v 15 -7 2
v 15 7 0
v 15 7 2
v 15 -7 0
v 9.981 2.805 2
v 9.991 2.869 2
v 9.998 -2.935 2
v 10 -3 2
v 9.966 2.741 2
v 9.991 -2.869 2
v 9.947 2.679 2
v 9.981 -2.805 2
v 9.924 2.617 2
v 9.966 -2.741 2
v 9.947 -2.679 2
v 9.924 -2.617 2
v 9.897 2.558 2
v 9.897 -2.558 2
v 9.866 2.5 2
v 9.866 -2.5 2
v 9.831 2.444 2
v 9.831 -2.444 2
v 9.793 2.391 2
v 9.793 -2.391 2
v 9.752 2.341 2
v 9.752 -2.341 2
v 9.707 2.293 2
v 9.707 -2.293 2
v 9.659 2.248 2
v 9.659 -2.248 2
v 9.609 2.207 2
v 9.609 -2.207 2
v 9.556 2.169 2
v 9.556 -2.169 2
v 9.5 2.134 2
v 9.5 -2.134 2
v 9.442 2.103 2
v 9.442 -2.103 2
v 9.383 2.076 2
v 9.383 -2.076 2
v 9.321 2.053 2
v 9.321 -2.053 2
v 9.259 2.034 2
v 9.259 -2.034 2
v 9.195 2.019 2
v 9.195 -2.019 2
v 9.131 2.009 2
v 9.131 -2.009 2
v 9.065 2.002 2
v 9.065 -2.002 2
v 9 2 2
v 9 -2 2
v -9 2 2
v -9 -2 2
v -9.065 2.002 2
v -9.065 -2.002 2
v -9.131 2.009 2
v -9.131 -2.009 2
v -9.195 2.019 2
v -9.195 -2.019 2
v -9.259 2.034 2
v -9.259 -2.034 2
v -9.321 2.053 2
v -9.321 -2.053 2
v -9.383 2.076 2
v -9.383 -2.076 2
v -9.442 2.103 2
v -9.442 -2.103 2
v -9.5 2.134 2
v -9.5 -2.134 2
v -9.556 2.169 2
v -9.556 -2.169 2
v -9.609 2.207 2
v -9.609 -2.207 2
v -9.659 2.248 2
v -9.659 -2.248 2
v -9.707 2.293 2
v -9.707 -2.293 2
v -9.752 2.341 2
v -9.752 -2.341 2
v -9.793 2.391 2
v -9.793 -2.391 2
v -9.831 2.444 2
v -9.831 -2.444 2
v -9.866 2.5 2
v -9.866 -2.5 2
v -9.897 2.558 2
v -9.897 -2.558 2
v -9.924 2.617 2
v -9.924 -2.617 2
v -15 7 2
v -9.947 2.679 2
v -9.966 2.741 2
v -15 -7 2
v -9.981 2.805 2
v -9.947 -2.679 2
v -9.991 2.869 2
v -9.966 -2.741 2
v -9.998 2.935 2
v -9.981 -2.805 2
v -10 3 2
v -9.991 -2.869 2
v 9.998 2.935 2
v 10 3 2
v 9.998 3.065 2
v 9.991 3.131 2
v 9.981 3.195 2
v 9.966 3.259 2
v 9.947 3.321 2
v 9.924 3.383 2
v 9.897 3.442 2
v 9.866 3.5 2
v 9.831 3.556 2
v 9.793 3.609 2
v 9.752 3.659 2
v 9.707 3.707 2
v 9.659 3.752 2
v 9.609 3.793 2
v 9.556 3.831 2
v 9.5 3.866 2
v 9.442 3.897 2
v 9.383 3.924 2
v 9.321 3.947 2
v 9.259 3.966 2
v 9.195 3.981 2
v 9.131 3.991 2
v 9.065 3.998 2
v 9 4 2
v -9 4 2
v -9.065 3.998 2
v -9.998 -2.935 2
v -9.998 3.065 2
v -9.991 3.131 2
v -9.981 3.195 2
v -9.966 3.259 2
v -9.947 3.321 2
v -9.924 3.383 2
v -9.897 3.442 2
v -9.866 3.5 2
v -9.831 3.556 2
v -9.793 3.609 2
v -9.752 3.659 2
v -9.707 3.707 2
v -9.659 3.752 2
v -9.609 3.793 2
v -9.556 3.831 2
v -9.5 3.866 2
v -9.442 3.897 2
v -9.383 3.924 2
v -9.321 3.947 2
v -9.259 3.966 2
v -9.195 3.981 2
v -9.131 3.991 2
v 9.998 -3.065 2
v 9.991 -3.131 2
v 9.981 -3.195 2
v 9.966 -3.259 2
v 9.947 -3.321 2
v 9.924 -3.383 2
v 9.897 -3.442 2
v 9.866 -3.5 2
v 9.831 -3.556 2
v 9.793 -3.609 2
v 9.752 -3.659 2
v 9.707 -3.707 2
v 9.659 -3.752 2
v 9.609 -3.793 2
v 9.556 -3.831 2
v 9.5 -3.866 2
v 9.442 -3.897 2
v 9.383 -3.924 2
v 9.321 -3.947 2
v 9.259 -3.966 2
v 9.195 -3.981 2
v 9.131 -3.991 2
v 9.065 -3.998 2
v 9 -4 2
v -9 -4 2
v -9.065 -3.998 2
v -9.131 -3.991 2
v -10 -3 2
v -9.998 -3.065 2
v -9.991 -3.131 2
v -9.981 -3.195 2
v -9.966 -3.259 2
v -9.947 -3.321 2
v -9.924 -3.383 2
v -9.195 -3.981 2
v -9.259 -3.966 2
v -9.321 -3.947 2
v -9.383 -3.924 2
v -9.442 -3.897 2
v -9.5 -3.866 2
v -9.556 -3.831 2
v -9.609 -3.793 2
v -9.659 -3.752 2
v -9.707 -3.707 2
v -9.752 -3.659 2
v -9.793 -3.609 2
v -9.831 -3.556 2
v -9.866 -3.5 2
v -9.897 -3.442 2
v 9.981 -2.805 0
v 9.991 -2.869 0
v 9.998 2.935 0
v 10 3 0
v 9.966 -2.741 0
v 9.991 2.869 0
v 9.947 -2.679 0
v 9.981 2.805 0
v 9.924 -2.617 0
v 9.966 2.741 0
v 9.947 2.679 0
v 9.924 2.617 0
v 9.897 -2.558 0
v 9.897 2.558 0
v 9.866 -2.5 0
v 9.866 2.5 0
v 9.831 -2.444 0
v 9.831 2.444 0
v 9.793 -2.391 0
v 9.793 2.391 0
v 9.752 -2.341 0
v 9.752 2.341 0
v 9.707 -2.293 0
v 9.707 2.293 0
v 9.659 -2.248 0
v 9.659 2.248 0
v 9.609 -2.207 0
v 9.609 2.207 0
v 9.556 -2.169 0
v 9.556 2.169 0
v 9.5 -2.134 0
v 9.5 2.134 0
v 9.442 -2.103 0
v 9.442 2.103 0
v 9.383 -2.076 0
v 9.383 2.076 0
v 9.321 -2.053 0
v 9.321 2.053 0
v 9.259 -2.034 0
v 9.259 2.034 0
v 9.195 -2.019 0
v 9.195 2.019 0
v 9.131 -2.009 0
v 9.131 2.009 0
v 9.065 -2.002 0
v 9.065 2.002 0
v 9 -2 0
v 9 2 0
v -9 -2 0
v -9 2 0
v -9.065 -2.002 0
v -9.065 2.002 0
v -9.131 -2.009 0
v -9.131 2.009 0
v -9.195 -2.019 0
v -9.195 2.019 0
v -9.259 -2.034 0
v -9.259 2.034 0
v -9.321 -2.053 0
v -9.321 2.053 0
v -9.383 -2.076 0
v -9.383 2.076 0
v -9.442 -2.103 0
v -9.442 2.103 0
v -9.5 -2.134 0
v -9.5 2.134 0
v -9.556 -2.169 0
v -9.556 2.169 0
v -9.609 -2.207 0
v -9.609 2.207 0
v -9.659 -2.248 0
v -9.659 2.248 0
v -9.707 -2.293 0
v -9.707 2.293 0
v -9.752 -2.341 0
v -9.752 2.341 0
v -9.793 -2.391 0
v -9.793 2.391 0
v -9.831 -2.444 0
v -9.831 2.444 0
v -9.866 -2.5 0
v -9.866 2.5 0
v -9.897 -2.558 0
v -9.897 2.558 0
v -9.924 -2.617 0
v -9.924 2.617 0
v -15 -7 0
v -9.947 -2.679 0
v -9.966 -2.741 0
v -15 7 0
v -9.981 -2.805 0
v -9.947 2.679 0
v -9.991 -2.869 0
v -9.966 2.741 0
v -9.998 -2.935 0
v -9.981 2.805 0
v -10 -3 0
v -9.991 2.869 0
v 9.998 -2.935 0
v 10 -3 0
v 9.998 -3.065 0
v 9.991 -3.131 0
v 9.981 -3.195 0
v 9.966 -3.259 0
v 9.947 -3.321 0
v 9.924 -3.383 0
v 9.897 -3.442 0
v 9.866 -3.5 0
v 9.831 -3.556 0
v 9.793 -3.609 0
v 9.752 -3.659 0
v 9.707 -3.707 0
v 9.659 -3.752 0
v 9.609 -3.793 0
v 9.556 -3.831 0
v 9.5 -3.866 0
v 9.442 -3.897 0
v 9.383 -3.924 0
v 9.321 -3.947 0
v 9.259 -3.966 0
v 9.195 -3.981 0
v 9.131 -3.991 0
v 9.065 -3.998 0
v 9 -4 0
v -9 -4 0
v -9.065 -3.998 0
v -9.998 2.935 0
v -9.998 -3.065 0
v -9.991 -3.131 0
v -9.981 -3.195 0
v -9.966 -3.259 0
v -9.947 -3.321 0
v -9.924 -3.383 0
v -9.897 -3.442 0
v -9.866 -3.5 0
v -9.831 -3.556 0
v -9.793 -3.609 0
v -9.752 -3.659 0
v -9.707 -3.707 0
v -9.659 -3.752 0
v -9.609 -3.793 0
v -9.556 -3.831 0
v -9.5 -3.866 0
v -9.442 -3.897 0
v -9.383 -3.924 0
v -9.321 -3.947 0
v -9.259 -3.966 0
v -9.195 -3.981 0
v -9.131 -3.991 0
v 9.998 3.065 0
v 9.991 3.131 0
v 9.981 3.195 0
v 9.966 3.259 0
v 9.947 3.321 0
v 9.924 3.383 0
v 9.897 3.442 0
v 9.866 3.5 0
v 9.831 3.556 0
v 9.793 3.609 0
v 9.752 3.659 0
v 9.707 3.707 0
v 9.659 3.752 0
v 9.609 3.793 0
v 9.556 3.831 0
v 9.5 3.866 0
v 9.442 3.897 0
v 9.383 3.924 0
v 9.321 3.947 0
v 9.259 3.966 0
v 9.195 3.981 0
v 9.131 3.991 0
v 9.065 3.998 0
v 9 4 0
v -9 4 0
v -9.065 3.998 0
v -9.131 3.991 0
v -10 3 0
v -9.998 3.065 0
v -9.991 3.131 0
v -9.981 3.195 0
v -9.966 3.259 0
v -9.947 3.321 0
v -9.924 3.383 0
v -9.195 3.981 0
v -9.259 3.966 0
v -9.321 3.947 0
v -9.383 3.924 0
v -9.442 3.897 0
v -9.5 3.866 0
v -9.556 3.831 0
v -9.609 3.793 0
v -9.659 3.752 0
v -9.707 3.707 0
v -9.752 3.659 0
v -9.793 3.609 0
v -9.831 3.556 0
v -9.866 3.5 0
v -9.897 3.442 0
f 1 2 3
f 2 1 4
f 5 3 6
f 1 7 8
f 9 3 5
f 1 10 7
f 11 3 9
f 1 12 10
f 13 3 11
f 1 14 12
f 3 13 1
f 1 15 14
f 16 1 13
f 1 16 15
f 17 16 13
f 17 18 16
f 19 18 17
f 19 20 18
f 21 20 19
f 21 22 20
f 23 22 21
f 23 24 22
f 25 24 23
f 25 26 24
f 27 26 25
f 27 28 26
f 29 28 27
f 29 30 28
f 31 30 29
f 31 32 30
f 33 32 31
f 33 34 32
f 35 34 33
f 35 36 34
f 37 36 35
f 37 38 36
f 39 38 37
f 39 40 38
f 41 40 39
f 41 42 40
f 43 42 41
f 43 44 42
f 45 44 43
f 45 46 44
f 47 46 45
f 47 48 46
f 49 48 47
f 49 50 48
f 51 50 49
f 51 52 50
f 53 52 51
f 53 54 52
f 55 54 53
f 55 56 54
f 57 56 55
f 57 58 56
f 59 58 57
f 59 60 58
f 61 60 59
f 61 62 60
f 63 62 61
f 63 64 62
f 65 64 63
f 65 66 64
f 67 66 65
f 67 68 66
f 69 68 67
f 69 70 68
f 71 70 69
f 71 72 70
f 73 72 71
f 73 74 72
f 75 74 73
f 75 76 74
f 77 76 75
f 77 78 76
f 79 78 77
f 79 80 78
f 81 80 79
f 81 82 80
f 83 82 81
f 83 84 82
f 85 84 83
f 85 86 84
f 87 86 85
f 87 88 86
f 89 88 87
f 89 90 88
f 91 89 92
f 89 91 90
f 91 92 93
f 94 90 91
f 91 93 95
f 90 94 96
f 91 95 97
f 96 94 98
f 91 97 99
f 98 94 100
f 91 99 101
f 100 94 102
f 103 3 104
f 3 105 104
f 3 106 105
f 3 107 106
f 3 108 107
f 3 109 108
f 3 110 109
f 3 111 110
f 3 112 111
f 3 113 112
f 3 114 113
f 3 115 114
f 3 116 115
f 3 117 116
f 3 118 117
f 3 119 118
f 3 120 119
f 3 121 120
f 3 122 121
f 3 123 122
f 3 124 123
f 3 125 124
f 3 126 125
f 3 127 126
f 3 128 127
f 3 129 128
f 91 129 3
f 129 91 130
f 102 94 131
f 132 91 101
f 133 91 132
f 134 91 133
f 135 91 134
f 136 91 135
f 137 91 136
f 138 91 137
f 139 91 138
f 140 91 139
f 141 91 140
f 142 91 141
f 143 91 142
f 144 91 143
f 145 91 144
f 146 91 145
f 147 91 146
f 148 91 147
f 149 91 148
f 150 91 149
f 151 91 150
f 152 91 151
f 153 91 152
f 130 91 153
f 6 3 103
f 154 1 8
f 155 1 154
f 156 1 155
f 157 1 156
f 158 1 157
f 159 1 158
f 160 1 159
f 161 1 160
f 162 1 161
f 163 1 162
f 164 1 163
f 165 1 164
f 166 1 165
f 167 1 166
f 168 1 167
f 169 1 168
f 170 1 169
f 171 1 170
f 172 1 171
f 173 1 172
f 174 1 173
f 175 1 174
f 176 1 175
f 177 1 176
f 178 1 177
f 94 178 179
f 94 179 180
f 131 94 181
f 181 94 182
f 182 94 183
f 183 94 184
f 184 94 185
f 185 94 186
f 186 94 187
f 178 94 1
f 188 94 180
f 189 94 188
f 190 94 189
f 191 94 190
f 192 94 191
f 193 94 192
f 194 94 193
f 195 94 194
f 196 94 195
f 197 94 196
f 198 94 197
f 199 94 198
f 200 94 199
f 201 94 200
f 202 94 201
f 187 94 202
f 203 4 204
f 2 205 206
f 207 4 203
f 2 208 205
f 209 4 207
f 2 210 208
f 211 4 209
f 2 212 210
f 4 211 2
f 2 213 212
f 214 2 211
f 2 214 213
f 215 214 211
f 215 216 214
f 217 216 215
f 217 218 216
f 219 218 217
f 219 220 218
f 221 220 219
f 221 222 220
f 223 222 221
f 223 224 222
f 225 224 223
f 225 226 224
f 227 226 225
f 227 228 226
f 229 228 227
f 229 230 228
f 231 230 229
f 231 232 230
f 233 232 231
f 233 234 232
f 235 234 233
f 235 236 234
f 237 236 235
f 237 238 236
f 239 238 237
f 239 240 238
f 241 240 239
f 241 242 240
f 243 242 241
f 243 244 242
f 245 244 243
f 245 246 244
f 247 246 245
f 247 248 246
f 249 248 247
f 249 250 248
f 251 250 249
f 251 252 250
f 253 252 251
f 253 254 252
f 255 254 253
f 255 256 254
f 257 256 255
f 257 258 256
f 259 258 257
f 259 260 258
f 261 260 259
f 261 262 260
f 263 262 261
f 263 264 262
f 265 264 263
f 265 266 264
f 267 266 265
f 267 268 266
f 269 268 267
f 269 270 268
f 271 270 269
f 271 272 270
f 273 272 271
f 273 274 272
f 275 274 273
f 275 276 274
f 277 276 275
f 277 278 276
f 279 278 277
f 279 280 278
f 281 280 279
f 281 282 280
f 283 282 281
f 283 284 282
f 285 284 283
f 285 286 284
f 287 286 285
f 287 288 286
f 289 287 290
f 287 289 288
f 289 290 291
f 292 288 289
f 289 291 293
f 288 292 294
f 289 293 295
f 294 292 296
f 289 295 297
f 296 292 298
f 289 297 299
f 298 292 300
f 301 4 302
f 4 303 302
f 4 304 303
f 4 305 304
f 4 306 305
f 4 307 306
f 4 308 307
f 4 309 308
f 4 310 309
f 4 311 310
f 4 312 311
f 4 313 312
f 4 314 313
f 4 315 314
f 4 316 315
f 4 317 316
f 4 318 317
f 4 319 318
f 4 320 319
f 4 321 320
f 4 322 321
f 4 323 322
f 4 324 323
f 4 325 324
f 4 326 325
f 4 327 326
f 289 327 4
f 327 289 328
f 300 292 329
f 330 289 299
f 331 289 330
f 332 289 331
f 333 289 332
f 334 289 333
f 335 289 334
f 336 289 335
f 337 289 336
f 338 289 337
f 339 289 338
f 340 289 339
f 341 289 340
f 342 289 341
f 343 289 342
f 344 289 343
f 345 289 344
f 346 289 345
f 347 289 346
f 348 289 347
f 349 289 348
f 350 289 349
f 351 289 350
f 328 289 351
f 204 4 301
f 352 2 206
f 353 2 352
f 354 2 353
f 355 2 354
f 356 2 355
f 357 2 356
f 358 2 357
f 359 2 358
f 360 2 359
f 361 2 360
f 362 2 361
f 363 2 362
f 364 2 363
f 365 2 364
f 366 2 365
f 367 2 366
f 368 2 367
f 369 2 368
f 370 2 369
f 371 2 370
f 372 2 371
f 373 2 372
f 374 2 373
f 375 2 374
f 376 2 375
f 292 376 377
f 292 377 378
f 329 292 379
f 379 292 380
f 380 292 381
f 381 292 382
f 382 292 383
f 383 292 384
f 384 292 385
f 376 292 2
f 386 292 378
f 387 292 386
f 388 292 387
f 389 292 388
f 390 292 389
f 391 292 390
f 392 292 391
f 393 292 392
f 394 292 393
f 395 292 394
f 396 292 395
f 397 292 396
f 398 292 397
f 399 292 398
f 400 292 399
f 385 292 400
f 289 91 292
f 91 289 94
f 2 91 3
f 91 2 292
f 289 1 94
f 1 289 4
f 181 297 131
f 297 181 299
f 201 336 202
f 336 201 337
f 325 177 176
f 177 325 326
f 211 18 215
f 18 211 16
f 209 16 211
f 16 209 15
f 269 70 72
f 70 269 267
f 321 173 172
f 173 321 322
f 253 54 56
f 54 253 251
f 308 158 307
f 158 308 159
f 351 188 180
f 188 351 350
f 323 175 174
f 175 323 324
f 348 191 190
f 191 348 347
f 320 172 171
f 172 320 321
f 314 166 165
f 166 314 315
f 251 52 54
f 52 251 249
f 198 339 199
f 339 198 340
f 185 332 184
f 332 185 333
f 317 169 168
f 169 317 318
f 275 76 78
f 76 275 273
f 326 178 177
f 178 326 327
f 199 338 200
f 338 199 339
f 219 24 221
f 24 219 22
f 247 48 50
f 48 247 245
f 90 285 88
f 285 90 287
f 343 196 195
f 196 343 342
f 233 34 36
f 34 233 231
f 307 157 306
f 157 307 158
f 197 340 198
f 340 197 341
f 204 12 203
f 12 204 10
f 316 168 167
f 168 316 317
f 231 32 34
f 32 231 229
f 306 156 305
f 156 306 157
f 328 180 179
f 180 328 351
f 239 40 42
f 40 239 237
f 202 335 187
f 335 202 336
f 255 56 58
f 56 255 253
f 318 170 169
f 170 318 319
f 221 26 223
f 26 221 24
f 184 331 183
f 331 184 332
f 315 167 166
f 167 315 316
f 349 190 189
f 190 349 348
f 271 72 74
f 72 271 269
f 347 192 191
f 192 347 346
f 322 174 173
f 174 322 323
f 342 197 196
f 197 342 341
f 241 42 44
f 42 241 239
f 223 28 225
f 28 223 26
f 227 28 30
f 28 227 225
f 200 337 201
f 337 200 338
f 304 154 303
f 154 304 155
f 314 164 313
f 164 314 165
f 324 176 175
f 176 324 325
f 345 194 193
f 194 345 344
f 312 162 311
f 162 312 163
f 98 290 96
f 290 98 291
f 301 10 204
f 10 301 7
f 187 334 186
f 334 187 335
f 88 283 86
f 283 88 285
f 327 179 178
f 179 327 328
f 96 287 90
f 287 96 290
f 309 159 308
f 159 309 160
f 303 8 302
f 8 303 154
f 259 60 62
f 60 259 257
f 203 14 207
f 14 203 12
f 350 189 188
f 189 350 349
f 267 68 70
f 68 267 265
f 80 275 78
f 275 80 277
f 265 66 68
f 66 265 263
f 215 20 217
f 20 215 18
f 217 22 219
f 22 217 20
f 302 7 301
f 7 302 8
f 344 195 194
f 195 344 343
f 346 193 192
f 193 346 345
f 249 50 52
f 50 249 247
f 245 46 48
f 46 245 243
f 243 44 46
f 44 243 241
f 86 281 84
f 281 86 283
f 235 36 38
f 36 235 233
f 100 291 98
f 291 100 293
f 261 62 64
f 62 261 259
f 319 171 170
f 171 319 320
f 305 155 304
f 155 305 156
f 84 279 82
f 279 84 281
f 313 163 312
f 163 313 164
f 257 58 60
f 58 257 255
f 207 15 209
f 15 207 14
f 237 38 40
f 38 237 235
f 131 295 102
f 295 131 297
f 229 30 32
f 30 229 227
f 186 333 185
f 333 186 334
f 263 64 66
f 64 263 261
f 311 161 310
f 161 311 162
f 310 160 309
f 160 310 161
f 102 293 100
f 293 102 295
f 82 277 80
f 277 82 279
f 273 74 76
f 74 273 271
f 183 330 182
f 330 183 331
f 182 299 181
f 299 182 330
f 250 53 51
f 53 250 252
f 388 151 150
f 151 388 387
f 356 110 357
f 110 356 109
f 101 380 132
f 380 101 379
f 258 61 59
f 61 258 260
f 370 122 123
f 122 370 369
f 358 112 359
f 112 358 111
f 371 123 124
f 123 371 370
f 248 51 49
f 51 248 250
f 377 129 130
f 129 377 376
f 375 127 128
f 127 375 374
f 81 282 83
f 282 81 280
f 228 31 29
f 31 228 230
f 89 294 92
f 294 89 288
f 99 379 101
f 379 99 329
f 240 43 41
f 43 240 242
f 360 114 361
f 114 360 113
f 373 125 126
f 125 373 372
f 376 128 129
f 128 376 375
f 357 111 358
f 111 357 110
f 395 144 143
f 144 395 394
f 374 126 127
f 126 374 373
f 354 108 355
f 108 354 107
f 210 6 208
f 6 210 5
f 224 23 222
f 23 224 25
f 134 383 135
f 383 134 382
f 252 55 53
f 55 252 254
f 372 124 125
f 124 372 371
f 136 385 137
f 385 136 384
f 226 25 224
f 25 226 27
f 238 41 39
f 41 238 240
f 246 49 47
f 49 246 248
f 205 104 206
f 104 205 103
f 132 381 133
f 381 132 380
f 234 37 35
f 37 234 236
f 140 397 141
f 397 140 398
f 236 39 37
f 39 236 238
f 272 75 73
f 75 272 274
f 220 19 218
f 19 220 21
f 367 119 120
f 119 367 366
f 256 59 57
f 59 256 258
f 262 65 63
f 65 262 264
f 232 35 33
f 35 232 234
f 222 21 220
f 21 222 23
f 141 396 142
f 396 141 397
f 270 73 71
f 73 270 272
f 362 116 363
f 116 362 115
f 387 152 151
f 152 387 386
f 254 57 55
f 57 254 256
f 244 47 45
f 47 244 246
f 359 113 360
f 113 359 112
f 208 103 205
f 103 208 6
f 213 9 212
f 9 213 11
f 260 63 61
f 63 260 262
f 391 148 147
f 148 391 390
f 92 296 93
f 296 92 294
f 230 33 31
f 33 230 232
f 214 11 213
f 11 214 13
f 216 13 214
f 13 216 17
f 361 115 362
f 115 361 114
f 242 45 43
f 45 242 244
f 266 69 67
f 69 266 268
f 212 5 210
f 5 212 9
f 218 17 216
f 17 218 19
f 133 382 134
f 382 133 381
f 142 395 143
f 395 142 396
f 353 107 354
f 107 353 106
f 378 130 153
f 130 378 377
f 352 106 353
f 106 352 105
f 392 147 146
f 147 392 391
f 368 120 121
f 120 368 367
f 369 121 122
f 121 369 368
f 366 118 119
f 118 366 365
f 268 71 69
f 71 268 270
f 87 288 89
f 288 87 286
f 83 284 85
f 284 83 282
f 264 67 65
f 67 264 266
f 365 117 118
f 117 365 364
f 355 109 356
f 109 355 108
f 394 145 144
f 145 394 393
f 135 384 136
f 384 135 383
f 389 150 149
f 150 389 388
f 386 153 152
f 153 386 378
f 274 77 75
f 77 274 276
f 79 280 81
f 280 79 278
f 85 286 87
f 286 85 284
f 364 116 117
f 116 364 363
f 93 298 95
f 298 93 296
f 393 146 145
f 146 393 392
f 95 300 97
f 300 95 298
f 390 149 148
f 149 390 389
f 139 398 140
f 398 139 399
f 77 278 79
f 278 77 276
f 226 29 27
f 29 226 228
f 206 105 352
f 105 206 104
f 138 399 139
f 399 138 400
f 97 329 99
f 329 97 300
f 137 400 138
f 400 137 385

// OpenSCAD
// Auto-generated from tests/data/feature_fixtures_manifest.json
// fixture: plate_slot_pair
// fixture_type: plate
// description: Two parallel X-direction slots offset in Y. Tests multi-slot counting on a single plate.
$fn = 96;

plate_size = [30.000000, 14.000000, 2.000000];
plate_origin = [-15.000000, -7.000000, 0.000000];

module through_hole(center, diameter, height) {
  translate(center) cylinder(d=diameter, h=height, center=false);
}

module through_slot(start, end, width, height) {
  hull() {
    through_hole(start, width, height);
    through_hole(end, width, height);
  }
}

module counterbore_hole(center, through_d, bore_d, bore_depth, plate_thickness) {
  translate([center[0], center[1], -0.1])
    cylinder(d=through_d, h=plate_thickness + 0.2, center=false);
  translate([center[0], center[1], plate_thickness - bore_depth])
    cylinder(d=bore_d, h=bore_depth + 0.1, center=false);
}

difference() {
  translate(plate_origin) cube(plate_size);
  through_slot([-9.000000, -3.000000, -0.100000], [9.000000, -3.000000, -0.100000], 2.000000, 2.200000);  // slot_0
  through_slot([-9.000000, 3.000000, -0.100000], [9.000000, 3.000000, -0.100000], 2.000000, 2.200000);  // slot_1
}
